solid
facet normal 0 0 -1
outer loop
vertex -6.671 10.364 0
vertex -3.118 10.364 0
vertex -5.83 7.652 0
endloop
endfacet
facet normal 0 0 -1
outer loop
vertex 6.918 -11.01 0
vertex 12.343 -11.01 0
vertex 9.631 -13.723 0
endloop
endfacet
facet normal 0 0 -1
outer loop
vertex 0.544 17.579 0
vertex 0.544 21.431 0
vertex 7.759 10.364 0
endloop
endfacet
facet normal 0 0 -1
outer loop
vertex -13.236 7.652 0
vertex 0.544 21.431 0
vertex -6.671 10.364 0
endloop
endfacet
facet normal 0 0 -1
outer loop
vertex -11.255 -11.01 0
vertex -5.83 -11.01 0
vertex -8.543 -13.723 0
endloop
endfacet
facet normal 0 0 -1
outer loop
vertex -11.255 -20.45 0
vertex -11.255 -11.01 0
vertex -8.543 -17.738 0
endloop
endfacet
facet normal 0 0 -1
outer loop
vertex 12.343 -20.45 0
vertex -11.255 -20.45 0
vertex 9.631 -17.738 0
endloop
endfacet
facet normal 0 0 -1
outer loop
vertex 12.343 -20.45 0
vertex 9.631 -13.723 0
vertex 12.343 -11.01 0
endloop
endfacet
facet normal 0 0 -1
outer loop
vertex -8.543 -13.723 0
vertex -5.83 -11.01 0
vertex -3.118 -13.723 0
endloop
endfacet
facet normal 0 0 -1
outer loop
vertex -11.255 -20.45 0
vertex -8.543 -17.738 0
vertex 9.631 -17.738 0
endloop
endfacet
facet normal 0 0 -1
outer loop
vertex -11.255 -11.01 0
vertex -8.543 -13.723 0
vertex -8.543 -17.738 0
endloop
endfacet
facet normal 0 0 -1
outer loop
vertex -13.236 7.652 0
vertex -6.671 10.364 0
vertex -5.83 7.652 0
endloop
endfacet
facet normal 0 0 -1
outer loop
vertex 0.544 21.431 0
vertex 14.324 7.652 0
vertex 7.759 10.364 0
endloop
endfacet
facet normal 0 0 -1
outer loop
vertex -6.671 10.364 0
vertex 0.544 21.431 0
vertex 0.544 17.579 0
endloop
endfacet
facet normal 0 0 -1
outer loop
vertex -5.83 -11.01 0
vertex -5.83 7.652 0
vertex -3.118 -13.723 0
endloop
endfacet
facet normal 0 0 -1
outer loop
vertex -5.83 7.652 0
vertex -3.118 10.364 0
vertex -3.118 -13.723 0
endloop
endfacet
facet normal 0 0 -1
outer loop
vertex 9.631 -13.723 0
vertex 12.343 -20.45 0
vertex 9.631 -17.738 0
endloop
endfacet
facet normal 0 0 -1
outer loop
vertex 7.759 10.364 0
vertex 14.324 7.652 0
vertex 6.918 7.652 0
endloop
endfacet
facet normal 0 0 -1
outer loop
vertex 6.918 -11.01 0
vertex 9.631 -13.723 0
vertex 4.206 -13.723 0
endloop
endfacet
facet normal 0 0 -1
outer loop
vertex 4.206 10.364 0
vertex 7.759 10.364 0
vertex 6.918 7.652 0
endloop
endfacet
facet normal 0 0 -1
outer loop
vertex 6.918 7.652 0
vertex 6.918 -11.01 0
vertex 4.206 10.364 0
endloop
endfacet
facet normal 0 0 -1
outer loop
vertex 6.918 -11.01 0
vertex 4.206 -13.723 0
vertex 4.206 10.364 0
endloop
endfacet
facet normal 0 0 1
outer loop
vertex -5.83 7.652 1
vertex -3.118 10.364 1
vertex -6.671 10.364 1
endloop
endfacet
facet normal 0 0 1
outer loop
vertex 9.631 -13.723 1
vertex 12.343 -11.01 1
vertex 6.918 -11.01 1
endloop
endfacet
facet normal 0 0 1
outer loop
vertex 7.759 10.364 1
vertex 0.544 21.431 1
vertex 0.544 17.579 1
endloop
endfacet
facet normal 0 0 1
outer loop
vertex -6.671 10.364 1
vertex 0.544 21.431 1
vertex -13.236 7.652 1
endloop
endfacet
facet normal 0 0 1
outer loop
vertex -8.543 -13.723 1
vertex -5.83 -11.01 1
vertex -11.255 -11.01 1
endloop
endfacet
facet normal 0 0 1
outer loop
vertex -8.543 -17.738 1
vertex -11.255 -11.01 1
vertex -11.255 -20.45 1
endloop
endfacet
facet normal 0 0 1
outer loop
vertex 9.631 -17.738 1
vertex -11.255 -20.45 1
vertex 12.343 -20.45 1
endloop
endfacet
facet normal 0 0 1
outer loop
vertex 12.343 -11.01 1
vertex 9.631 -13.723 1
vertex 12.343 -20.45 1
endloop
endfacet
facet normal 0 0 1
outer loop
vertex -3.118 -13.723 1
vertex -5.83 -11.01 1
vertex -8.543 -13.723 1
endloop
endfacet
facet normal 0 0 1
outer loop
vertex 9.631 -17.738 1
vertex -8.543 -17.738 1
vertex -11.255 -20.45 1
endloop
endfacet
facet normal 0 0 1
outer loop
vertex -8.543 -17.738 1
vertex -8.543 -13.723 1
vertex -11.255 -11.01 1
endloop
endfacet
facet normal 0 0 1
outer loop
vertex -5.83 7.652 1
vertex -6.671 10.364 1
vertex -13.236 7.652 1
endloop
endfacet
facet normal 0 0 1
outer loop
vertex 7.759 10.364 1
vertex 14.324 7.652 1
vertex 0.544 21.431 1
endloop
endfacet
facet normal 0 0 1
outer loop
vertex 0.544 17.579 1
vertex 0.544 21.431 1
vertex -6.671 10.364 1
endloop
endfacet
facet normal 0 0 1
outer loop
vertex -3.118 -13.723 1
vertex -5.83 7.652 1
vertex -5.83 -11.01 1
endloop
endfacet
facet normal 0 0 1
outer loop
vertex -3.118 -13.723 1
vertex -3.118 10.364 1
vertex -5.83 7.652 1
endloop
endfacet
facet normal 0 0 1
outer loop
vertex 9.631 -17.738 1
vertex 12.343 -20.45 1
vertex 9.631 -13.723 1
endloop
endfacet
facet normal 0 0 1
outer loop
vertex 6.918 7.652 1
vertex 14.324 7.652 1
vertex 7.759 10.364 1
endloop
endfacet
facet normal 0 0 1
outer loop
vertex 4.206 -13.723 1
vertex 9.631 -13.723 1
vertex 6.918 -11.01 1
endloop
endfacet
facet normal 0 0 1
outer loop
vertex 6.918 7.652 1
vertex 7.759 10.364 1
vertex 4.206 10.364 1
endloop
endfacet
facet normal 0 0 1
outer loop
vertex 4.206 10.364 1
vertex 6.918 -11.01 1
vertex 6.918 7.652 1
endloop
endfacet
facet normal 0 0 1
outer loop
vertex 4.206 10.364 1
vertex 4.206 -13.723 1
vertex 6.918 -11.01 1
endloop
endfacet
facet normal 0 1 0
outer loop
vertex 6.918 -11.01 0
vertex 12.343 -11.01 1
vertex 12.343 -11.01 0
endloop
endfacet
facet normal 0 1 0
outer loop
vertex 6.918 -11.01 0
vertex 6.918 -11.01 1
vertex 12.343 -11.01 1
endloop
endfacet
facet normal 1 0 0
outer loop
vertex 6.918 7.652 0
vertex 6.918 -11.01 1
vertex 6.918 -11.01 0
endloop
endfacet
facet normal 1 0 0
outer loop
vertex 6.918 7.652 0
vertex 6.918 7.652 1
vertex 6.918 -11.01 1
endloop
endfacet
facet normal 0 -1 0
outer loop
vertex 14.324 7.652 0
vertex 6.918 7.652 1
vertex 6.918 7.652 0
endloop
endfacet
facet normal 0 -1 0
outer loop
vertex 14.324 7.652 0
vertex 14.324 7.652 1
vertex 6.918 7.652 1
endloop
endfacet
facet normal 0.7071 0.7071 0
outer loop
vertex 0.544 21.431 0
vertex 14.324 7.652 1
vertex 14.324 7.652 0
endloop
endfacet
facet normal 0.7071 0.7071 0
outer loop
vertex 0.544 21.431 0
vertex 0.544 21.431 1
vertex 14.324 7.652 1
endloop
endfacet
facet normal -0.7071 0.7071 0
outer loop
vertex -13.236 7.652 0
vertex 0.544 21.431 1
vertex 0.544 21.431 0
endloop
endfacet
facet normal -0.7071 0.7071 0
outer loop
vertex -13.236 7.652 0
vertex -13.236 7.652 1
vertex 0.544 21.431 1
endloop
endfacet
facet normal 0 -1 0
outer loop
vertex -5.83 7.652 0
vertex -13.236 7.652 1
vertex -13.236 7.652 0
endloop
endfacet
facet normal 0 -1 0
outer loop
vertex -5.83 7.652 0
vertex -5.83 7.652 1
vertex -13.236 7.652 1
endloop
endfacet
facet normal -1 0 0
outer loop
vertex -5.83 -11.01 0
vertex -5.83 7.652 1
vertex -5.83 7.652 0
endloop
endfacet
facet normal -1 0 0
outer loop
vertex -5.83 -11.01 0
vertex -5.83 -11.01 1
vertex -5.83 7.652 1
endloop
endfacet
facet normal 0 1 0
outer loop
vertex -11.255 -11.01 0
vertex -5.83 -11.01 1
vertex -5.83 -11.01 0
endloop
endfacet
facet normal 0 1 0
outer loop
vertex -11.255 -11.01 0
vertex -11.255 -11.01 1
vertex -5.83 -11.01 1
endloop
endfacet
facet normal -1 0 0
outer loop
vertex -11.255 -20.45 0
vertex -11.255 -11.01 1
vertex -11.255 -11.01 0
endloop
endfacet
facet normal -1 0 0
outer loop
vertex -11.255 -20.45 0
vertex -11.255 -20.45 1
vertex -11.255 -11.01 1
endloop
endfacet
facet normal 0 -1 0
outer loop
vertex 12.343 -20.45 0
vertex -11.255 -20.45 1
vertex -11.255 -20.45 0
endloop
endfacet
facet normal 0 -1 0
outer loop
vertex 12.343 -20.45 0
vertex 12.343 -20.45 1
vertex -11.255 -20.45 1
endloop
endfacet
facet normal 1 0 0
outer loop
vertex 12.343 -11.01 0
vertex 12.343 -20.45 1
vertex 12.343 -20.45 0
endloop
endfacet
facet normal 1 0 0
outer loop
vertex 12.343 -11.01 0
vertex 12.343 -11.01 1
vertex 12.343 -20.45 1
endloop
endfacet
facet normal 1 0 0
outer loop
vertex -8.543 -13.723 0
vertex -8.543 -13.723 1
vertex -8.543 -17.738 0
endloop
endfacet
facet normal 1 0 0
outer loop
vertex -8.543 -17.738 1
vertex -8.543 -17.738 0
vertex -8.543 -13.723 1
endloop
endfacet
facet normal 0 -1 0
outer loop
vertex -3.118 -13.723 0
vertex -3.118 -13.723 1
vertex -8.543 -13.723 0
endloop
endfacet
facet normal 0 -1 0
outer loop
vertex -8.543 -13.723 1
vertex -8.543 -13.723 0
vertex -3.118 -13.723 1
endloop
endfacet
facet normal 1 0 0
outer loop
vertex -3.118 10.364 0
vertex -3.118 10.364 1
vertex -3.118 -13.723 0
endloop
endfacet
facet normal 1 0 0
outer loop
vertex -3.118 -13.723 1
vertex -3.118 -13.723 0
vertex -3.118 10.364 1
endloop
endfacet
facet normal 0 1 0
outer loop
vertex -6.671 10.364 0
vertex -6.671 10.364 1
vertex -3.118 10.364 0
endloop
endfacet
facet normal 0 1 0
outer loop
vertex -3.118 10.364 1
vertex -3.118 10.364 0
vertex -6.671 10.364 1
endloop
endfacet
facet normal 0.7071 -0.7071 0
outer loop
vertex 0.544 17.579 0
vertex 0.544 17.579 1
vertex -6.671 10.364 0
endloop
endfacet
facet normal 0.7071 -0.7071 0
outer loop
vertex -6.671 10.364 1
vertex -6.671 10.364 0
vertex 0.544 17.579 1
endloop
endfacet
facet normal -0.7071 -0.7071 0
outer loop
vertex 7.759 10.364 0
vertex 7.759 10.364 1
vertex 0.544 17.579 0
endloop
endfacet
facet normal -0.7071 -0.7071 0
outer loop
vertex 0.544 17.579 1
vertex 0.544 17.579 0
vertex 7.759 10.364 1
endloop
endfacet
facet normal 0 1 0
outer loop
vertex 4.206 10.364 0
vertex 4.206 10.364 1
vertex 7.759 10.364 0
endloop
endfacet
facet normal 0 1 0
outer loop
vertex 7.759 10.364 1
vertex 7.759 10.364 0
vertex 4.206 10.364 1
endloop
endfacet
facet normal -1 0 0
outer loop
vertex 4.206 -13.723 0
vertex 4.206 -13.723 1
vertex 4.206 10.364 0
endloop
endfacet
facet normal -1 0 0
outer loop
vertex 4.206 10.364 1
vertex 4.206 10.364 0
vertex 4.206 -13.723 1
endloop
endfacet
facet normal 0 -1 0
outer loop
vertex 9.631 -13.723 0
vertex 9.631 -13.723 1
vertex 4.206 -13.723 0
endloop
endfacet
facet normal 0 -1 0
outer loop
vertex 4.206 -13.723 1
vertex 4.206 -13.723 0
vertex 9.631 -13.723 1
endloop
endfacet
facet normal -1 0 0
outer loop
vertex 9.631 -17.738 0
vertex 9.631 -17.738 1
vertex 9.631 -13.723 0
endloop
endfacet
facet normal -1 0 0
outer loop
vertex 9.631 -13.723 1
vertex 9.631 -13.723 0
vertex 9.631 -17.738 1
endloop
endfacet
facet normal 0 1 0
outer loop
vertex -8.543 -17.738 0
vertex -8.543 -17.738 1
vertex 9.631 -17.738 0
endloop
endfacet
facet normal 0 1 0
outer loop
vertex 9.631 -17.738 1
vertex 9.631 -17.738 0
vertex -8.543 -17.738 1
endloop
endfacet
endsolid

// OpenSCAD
// -*- mode: SCAD ; c-file-style: "ellemtel" ; coding: utf-8 -*-
//
// NN
//
// © 2018 Roland Sieker <ospalh@gmail.com>
// Licence: CC-BY-SA 4.0

/* [Global] */

// … to preview. You will get all parts when you click “Create Thing”.
part = "arrow"; // [NN: foo, bar: baz]

// Set this to “render” and click on “Create Thing” when done with the setup.
preview = 1; // [0:render, 1:preview]

/* [Sizes] */

// bla bla
size_x = 15;  // [1:0.1:40]

/* [Hidden] */

// Done with the customizer

// *******************************************************
// Extra parameters. These can be changed reasonably safely.


w = 1.8;  // Wall width
p = 1.2;  // Bottom, top plate height
c = 0.4;  // Clearance
angle = 60; // Overhangs much below 60° are a problem for me

// *******************************************************
// Some shortcuts. These shouldn’t be changed

tau = 2 * PI;  // π is still wrong. τ = circumference / r

xy_factor = 1/tan(angle);
// To get from a height to a horizontal width inclined correctly
z_factor = tan(angle);  // The other way around


some_distance = 50;
ms = 0.01;  // Muggeseggele.

// fn for differently sized objects and fs, fa; all for preview or rendering.
pna = 40;
pnb = 15;
pa = 5;
ps = 1;
rna = 180;
rnb = 30;
ra = 1;
rs = 0.1;
function na() = (preview) ? pna : rna;
function nb() = (preview) ? pnb : rnb;
$fs = (preview) ? ps : rs;
$fa = (preview) ? pa : ra;

// *******************************************************
// End setup



// *******************************************************
// Generate the parts

print_part();
// preview_parts();
// stack_parts();



module print_part()
{
   if ("arrow" == part)
   {
      arrow();
   }
   if ("foo" == part)
   {
      foo();
   }
}

module preview_parts()
{
   nn();
   translate([some_distance, 0, 0])
   {
      foo();
   }
}

module stack_parts()
{
   // intersection()
   {
      color("yellow")
      {
         foo();
      }
      translate([0,0,30])
      {
         color("red")
         {
            NN();
         }
      }
   }
}

// *******************************************************
// Code for the parts themselves


module arrow()
{

   linear_extrude(1, convexity=8)
   {
      text(
         text="⇫", font="Symbola:style=Regular",
         valign="center", halign="center", size=40);
   }
}
